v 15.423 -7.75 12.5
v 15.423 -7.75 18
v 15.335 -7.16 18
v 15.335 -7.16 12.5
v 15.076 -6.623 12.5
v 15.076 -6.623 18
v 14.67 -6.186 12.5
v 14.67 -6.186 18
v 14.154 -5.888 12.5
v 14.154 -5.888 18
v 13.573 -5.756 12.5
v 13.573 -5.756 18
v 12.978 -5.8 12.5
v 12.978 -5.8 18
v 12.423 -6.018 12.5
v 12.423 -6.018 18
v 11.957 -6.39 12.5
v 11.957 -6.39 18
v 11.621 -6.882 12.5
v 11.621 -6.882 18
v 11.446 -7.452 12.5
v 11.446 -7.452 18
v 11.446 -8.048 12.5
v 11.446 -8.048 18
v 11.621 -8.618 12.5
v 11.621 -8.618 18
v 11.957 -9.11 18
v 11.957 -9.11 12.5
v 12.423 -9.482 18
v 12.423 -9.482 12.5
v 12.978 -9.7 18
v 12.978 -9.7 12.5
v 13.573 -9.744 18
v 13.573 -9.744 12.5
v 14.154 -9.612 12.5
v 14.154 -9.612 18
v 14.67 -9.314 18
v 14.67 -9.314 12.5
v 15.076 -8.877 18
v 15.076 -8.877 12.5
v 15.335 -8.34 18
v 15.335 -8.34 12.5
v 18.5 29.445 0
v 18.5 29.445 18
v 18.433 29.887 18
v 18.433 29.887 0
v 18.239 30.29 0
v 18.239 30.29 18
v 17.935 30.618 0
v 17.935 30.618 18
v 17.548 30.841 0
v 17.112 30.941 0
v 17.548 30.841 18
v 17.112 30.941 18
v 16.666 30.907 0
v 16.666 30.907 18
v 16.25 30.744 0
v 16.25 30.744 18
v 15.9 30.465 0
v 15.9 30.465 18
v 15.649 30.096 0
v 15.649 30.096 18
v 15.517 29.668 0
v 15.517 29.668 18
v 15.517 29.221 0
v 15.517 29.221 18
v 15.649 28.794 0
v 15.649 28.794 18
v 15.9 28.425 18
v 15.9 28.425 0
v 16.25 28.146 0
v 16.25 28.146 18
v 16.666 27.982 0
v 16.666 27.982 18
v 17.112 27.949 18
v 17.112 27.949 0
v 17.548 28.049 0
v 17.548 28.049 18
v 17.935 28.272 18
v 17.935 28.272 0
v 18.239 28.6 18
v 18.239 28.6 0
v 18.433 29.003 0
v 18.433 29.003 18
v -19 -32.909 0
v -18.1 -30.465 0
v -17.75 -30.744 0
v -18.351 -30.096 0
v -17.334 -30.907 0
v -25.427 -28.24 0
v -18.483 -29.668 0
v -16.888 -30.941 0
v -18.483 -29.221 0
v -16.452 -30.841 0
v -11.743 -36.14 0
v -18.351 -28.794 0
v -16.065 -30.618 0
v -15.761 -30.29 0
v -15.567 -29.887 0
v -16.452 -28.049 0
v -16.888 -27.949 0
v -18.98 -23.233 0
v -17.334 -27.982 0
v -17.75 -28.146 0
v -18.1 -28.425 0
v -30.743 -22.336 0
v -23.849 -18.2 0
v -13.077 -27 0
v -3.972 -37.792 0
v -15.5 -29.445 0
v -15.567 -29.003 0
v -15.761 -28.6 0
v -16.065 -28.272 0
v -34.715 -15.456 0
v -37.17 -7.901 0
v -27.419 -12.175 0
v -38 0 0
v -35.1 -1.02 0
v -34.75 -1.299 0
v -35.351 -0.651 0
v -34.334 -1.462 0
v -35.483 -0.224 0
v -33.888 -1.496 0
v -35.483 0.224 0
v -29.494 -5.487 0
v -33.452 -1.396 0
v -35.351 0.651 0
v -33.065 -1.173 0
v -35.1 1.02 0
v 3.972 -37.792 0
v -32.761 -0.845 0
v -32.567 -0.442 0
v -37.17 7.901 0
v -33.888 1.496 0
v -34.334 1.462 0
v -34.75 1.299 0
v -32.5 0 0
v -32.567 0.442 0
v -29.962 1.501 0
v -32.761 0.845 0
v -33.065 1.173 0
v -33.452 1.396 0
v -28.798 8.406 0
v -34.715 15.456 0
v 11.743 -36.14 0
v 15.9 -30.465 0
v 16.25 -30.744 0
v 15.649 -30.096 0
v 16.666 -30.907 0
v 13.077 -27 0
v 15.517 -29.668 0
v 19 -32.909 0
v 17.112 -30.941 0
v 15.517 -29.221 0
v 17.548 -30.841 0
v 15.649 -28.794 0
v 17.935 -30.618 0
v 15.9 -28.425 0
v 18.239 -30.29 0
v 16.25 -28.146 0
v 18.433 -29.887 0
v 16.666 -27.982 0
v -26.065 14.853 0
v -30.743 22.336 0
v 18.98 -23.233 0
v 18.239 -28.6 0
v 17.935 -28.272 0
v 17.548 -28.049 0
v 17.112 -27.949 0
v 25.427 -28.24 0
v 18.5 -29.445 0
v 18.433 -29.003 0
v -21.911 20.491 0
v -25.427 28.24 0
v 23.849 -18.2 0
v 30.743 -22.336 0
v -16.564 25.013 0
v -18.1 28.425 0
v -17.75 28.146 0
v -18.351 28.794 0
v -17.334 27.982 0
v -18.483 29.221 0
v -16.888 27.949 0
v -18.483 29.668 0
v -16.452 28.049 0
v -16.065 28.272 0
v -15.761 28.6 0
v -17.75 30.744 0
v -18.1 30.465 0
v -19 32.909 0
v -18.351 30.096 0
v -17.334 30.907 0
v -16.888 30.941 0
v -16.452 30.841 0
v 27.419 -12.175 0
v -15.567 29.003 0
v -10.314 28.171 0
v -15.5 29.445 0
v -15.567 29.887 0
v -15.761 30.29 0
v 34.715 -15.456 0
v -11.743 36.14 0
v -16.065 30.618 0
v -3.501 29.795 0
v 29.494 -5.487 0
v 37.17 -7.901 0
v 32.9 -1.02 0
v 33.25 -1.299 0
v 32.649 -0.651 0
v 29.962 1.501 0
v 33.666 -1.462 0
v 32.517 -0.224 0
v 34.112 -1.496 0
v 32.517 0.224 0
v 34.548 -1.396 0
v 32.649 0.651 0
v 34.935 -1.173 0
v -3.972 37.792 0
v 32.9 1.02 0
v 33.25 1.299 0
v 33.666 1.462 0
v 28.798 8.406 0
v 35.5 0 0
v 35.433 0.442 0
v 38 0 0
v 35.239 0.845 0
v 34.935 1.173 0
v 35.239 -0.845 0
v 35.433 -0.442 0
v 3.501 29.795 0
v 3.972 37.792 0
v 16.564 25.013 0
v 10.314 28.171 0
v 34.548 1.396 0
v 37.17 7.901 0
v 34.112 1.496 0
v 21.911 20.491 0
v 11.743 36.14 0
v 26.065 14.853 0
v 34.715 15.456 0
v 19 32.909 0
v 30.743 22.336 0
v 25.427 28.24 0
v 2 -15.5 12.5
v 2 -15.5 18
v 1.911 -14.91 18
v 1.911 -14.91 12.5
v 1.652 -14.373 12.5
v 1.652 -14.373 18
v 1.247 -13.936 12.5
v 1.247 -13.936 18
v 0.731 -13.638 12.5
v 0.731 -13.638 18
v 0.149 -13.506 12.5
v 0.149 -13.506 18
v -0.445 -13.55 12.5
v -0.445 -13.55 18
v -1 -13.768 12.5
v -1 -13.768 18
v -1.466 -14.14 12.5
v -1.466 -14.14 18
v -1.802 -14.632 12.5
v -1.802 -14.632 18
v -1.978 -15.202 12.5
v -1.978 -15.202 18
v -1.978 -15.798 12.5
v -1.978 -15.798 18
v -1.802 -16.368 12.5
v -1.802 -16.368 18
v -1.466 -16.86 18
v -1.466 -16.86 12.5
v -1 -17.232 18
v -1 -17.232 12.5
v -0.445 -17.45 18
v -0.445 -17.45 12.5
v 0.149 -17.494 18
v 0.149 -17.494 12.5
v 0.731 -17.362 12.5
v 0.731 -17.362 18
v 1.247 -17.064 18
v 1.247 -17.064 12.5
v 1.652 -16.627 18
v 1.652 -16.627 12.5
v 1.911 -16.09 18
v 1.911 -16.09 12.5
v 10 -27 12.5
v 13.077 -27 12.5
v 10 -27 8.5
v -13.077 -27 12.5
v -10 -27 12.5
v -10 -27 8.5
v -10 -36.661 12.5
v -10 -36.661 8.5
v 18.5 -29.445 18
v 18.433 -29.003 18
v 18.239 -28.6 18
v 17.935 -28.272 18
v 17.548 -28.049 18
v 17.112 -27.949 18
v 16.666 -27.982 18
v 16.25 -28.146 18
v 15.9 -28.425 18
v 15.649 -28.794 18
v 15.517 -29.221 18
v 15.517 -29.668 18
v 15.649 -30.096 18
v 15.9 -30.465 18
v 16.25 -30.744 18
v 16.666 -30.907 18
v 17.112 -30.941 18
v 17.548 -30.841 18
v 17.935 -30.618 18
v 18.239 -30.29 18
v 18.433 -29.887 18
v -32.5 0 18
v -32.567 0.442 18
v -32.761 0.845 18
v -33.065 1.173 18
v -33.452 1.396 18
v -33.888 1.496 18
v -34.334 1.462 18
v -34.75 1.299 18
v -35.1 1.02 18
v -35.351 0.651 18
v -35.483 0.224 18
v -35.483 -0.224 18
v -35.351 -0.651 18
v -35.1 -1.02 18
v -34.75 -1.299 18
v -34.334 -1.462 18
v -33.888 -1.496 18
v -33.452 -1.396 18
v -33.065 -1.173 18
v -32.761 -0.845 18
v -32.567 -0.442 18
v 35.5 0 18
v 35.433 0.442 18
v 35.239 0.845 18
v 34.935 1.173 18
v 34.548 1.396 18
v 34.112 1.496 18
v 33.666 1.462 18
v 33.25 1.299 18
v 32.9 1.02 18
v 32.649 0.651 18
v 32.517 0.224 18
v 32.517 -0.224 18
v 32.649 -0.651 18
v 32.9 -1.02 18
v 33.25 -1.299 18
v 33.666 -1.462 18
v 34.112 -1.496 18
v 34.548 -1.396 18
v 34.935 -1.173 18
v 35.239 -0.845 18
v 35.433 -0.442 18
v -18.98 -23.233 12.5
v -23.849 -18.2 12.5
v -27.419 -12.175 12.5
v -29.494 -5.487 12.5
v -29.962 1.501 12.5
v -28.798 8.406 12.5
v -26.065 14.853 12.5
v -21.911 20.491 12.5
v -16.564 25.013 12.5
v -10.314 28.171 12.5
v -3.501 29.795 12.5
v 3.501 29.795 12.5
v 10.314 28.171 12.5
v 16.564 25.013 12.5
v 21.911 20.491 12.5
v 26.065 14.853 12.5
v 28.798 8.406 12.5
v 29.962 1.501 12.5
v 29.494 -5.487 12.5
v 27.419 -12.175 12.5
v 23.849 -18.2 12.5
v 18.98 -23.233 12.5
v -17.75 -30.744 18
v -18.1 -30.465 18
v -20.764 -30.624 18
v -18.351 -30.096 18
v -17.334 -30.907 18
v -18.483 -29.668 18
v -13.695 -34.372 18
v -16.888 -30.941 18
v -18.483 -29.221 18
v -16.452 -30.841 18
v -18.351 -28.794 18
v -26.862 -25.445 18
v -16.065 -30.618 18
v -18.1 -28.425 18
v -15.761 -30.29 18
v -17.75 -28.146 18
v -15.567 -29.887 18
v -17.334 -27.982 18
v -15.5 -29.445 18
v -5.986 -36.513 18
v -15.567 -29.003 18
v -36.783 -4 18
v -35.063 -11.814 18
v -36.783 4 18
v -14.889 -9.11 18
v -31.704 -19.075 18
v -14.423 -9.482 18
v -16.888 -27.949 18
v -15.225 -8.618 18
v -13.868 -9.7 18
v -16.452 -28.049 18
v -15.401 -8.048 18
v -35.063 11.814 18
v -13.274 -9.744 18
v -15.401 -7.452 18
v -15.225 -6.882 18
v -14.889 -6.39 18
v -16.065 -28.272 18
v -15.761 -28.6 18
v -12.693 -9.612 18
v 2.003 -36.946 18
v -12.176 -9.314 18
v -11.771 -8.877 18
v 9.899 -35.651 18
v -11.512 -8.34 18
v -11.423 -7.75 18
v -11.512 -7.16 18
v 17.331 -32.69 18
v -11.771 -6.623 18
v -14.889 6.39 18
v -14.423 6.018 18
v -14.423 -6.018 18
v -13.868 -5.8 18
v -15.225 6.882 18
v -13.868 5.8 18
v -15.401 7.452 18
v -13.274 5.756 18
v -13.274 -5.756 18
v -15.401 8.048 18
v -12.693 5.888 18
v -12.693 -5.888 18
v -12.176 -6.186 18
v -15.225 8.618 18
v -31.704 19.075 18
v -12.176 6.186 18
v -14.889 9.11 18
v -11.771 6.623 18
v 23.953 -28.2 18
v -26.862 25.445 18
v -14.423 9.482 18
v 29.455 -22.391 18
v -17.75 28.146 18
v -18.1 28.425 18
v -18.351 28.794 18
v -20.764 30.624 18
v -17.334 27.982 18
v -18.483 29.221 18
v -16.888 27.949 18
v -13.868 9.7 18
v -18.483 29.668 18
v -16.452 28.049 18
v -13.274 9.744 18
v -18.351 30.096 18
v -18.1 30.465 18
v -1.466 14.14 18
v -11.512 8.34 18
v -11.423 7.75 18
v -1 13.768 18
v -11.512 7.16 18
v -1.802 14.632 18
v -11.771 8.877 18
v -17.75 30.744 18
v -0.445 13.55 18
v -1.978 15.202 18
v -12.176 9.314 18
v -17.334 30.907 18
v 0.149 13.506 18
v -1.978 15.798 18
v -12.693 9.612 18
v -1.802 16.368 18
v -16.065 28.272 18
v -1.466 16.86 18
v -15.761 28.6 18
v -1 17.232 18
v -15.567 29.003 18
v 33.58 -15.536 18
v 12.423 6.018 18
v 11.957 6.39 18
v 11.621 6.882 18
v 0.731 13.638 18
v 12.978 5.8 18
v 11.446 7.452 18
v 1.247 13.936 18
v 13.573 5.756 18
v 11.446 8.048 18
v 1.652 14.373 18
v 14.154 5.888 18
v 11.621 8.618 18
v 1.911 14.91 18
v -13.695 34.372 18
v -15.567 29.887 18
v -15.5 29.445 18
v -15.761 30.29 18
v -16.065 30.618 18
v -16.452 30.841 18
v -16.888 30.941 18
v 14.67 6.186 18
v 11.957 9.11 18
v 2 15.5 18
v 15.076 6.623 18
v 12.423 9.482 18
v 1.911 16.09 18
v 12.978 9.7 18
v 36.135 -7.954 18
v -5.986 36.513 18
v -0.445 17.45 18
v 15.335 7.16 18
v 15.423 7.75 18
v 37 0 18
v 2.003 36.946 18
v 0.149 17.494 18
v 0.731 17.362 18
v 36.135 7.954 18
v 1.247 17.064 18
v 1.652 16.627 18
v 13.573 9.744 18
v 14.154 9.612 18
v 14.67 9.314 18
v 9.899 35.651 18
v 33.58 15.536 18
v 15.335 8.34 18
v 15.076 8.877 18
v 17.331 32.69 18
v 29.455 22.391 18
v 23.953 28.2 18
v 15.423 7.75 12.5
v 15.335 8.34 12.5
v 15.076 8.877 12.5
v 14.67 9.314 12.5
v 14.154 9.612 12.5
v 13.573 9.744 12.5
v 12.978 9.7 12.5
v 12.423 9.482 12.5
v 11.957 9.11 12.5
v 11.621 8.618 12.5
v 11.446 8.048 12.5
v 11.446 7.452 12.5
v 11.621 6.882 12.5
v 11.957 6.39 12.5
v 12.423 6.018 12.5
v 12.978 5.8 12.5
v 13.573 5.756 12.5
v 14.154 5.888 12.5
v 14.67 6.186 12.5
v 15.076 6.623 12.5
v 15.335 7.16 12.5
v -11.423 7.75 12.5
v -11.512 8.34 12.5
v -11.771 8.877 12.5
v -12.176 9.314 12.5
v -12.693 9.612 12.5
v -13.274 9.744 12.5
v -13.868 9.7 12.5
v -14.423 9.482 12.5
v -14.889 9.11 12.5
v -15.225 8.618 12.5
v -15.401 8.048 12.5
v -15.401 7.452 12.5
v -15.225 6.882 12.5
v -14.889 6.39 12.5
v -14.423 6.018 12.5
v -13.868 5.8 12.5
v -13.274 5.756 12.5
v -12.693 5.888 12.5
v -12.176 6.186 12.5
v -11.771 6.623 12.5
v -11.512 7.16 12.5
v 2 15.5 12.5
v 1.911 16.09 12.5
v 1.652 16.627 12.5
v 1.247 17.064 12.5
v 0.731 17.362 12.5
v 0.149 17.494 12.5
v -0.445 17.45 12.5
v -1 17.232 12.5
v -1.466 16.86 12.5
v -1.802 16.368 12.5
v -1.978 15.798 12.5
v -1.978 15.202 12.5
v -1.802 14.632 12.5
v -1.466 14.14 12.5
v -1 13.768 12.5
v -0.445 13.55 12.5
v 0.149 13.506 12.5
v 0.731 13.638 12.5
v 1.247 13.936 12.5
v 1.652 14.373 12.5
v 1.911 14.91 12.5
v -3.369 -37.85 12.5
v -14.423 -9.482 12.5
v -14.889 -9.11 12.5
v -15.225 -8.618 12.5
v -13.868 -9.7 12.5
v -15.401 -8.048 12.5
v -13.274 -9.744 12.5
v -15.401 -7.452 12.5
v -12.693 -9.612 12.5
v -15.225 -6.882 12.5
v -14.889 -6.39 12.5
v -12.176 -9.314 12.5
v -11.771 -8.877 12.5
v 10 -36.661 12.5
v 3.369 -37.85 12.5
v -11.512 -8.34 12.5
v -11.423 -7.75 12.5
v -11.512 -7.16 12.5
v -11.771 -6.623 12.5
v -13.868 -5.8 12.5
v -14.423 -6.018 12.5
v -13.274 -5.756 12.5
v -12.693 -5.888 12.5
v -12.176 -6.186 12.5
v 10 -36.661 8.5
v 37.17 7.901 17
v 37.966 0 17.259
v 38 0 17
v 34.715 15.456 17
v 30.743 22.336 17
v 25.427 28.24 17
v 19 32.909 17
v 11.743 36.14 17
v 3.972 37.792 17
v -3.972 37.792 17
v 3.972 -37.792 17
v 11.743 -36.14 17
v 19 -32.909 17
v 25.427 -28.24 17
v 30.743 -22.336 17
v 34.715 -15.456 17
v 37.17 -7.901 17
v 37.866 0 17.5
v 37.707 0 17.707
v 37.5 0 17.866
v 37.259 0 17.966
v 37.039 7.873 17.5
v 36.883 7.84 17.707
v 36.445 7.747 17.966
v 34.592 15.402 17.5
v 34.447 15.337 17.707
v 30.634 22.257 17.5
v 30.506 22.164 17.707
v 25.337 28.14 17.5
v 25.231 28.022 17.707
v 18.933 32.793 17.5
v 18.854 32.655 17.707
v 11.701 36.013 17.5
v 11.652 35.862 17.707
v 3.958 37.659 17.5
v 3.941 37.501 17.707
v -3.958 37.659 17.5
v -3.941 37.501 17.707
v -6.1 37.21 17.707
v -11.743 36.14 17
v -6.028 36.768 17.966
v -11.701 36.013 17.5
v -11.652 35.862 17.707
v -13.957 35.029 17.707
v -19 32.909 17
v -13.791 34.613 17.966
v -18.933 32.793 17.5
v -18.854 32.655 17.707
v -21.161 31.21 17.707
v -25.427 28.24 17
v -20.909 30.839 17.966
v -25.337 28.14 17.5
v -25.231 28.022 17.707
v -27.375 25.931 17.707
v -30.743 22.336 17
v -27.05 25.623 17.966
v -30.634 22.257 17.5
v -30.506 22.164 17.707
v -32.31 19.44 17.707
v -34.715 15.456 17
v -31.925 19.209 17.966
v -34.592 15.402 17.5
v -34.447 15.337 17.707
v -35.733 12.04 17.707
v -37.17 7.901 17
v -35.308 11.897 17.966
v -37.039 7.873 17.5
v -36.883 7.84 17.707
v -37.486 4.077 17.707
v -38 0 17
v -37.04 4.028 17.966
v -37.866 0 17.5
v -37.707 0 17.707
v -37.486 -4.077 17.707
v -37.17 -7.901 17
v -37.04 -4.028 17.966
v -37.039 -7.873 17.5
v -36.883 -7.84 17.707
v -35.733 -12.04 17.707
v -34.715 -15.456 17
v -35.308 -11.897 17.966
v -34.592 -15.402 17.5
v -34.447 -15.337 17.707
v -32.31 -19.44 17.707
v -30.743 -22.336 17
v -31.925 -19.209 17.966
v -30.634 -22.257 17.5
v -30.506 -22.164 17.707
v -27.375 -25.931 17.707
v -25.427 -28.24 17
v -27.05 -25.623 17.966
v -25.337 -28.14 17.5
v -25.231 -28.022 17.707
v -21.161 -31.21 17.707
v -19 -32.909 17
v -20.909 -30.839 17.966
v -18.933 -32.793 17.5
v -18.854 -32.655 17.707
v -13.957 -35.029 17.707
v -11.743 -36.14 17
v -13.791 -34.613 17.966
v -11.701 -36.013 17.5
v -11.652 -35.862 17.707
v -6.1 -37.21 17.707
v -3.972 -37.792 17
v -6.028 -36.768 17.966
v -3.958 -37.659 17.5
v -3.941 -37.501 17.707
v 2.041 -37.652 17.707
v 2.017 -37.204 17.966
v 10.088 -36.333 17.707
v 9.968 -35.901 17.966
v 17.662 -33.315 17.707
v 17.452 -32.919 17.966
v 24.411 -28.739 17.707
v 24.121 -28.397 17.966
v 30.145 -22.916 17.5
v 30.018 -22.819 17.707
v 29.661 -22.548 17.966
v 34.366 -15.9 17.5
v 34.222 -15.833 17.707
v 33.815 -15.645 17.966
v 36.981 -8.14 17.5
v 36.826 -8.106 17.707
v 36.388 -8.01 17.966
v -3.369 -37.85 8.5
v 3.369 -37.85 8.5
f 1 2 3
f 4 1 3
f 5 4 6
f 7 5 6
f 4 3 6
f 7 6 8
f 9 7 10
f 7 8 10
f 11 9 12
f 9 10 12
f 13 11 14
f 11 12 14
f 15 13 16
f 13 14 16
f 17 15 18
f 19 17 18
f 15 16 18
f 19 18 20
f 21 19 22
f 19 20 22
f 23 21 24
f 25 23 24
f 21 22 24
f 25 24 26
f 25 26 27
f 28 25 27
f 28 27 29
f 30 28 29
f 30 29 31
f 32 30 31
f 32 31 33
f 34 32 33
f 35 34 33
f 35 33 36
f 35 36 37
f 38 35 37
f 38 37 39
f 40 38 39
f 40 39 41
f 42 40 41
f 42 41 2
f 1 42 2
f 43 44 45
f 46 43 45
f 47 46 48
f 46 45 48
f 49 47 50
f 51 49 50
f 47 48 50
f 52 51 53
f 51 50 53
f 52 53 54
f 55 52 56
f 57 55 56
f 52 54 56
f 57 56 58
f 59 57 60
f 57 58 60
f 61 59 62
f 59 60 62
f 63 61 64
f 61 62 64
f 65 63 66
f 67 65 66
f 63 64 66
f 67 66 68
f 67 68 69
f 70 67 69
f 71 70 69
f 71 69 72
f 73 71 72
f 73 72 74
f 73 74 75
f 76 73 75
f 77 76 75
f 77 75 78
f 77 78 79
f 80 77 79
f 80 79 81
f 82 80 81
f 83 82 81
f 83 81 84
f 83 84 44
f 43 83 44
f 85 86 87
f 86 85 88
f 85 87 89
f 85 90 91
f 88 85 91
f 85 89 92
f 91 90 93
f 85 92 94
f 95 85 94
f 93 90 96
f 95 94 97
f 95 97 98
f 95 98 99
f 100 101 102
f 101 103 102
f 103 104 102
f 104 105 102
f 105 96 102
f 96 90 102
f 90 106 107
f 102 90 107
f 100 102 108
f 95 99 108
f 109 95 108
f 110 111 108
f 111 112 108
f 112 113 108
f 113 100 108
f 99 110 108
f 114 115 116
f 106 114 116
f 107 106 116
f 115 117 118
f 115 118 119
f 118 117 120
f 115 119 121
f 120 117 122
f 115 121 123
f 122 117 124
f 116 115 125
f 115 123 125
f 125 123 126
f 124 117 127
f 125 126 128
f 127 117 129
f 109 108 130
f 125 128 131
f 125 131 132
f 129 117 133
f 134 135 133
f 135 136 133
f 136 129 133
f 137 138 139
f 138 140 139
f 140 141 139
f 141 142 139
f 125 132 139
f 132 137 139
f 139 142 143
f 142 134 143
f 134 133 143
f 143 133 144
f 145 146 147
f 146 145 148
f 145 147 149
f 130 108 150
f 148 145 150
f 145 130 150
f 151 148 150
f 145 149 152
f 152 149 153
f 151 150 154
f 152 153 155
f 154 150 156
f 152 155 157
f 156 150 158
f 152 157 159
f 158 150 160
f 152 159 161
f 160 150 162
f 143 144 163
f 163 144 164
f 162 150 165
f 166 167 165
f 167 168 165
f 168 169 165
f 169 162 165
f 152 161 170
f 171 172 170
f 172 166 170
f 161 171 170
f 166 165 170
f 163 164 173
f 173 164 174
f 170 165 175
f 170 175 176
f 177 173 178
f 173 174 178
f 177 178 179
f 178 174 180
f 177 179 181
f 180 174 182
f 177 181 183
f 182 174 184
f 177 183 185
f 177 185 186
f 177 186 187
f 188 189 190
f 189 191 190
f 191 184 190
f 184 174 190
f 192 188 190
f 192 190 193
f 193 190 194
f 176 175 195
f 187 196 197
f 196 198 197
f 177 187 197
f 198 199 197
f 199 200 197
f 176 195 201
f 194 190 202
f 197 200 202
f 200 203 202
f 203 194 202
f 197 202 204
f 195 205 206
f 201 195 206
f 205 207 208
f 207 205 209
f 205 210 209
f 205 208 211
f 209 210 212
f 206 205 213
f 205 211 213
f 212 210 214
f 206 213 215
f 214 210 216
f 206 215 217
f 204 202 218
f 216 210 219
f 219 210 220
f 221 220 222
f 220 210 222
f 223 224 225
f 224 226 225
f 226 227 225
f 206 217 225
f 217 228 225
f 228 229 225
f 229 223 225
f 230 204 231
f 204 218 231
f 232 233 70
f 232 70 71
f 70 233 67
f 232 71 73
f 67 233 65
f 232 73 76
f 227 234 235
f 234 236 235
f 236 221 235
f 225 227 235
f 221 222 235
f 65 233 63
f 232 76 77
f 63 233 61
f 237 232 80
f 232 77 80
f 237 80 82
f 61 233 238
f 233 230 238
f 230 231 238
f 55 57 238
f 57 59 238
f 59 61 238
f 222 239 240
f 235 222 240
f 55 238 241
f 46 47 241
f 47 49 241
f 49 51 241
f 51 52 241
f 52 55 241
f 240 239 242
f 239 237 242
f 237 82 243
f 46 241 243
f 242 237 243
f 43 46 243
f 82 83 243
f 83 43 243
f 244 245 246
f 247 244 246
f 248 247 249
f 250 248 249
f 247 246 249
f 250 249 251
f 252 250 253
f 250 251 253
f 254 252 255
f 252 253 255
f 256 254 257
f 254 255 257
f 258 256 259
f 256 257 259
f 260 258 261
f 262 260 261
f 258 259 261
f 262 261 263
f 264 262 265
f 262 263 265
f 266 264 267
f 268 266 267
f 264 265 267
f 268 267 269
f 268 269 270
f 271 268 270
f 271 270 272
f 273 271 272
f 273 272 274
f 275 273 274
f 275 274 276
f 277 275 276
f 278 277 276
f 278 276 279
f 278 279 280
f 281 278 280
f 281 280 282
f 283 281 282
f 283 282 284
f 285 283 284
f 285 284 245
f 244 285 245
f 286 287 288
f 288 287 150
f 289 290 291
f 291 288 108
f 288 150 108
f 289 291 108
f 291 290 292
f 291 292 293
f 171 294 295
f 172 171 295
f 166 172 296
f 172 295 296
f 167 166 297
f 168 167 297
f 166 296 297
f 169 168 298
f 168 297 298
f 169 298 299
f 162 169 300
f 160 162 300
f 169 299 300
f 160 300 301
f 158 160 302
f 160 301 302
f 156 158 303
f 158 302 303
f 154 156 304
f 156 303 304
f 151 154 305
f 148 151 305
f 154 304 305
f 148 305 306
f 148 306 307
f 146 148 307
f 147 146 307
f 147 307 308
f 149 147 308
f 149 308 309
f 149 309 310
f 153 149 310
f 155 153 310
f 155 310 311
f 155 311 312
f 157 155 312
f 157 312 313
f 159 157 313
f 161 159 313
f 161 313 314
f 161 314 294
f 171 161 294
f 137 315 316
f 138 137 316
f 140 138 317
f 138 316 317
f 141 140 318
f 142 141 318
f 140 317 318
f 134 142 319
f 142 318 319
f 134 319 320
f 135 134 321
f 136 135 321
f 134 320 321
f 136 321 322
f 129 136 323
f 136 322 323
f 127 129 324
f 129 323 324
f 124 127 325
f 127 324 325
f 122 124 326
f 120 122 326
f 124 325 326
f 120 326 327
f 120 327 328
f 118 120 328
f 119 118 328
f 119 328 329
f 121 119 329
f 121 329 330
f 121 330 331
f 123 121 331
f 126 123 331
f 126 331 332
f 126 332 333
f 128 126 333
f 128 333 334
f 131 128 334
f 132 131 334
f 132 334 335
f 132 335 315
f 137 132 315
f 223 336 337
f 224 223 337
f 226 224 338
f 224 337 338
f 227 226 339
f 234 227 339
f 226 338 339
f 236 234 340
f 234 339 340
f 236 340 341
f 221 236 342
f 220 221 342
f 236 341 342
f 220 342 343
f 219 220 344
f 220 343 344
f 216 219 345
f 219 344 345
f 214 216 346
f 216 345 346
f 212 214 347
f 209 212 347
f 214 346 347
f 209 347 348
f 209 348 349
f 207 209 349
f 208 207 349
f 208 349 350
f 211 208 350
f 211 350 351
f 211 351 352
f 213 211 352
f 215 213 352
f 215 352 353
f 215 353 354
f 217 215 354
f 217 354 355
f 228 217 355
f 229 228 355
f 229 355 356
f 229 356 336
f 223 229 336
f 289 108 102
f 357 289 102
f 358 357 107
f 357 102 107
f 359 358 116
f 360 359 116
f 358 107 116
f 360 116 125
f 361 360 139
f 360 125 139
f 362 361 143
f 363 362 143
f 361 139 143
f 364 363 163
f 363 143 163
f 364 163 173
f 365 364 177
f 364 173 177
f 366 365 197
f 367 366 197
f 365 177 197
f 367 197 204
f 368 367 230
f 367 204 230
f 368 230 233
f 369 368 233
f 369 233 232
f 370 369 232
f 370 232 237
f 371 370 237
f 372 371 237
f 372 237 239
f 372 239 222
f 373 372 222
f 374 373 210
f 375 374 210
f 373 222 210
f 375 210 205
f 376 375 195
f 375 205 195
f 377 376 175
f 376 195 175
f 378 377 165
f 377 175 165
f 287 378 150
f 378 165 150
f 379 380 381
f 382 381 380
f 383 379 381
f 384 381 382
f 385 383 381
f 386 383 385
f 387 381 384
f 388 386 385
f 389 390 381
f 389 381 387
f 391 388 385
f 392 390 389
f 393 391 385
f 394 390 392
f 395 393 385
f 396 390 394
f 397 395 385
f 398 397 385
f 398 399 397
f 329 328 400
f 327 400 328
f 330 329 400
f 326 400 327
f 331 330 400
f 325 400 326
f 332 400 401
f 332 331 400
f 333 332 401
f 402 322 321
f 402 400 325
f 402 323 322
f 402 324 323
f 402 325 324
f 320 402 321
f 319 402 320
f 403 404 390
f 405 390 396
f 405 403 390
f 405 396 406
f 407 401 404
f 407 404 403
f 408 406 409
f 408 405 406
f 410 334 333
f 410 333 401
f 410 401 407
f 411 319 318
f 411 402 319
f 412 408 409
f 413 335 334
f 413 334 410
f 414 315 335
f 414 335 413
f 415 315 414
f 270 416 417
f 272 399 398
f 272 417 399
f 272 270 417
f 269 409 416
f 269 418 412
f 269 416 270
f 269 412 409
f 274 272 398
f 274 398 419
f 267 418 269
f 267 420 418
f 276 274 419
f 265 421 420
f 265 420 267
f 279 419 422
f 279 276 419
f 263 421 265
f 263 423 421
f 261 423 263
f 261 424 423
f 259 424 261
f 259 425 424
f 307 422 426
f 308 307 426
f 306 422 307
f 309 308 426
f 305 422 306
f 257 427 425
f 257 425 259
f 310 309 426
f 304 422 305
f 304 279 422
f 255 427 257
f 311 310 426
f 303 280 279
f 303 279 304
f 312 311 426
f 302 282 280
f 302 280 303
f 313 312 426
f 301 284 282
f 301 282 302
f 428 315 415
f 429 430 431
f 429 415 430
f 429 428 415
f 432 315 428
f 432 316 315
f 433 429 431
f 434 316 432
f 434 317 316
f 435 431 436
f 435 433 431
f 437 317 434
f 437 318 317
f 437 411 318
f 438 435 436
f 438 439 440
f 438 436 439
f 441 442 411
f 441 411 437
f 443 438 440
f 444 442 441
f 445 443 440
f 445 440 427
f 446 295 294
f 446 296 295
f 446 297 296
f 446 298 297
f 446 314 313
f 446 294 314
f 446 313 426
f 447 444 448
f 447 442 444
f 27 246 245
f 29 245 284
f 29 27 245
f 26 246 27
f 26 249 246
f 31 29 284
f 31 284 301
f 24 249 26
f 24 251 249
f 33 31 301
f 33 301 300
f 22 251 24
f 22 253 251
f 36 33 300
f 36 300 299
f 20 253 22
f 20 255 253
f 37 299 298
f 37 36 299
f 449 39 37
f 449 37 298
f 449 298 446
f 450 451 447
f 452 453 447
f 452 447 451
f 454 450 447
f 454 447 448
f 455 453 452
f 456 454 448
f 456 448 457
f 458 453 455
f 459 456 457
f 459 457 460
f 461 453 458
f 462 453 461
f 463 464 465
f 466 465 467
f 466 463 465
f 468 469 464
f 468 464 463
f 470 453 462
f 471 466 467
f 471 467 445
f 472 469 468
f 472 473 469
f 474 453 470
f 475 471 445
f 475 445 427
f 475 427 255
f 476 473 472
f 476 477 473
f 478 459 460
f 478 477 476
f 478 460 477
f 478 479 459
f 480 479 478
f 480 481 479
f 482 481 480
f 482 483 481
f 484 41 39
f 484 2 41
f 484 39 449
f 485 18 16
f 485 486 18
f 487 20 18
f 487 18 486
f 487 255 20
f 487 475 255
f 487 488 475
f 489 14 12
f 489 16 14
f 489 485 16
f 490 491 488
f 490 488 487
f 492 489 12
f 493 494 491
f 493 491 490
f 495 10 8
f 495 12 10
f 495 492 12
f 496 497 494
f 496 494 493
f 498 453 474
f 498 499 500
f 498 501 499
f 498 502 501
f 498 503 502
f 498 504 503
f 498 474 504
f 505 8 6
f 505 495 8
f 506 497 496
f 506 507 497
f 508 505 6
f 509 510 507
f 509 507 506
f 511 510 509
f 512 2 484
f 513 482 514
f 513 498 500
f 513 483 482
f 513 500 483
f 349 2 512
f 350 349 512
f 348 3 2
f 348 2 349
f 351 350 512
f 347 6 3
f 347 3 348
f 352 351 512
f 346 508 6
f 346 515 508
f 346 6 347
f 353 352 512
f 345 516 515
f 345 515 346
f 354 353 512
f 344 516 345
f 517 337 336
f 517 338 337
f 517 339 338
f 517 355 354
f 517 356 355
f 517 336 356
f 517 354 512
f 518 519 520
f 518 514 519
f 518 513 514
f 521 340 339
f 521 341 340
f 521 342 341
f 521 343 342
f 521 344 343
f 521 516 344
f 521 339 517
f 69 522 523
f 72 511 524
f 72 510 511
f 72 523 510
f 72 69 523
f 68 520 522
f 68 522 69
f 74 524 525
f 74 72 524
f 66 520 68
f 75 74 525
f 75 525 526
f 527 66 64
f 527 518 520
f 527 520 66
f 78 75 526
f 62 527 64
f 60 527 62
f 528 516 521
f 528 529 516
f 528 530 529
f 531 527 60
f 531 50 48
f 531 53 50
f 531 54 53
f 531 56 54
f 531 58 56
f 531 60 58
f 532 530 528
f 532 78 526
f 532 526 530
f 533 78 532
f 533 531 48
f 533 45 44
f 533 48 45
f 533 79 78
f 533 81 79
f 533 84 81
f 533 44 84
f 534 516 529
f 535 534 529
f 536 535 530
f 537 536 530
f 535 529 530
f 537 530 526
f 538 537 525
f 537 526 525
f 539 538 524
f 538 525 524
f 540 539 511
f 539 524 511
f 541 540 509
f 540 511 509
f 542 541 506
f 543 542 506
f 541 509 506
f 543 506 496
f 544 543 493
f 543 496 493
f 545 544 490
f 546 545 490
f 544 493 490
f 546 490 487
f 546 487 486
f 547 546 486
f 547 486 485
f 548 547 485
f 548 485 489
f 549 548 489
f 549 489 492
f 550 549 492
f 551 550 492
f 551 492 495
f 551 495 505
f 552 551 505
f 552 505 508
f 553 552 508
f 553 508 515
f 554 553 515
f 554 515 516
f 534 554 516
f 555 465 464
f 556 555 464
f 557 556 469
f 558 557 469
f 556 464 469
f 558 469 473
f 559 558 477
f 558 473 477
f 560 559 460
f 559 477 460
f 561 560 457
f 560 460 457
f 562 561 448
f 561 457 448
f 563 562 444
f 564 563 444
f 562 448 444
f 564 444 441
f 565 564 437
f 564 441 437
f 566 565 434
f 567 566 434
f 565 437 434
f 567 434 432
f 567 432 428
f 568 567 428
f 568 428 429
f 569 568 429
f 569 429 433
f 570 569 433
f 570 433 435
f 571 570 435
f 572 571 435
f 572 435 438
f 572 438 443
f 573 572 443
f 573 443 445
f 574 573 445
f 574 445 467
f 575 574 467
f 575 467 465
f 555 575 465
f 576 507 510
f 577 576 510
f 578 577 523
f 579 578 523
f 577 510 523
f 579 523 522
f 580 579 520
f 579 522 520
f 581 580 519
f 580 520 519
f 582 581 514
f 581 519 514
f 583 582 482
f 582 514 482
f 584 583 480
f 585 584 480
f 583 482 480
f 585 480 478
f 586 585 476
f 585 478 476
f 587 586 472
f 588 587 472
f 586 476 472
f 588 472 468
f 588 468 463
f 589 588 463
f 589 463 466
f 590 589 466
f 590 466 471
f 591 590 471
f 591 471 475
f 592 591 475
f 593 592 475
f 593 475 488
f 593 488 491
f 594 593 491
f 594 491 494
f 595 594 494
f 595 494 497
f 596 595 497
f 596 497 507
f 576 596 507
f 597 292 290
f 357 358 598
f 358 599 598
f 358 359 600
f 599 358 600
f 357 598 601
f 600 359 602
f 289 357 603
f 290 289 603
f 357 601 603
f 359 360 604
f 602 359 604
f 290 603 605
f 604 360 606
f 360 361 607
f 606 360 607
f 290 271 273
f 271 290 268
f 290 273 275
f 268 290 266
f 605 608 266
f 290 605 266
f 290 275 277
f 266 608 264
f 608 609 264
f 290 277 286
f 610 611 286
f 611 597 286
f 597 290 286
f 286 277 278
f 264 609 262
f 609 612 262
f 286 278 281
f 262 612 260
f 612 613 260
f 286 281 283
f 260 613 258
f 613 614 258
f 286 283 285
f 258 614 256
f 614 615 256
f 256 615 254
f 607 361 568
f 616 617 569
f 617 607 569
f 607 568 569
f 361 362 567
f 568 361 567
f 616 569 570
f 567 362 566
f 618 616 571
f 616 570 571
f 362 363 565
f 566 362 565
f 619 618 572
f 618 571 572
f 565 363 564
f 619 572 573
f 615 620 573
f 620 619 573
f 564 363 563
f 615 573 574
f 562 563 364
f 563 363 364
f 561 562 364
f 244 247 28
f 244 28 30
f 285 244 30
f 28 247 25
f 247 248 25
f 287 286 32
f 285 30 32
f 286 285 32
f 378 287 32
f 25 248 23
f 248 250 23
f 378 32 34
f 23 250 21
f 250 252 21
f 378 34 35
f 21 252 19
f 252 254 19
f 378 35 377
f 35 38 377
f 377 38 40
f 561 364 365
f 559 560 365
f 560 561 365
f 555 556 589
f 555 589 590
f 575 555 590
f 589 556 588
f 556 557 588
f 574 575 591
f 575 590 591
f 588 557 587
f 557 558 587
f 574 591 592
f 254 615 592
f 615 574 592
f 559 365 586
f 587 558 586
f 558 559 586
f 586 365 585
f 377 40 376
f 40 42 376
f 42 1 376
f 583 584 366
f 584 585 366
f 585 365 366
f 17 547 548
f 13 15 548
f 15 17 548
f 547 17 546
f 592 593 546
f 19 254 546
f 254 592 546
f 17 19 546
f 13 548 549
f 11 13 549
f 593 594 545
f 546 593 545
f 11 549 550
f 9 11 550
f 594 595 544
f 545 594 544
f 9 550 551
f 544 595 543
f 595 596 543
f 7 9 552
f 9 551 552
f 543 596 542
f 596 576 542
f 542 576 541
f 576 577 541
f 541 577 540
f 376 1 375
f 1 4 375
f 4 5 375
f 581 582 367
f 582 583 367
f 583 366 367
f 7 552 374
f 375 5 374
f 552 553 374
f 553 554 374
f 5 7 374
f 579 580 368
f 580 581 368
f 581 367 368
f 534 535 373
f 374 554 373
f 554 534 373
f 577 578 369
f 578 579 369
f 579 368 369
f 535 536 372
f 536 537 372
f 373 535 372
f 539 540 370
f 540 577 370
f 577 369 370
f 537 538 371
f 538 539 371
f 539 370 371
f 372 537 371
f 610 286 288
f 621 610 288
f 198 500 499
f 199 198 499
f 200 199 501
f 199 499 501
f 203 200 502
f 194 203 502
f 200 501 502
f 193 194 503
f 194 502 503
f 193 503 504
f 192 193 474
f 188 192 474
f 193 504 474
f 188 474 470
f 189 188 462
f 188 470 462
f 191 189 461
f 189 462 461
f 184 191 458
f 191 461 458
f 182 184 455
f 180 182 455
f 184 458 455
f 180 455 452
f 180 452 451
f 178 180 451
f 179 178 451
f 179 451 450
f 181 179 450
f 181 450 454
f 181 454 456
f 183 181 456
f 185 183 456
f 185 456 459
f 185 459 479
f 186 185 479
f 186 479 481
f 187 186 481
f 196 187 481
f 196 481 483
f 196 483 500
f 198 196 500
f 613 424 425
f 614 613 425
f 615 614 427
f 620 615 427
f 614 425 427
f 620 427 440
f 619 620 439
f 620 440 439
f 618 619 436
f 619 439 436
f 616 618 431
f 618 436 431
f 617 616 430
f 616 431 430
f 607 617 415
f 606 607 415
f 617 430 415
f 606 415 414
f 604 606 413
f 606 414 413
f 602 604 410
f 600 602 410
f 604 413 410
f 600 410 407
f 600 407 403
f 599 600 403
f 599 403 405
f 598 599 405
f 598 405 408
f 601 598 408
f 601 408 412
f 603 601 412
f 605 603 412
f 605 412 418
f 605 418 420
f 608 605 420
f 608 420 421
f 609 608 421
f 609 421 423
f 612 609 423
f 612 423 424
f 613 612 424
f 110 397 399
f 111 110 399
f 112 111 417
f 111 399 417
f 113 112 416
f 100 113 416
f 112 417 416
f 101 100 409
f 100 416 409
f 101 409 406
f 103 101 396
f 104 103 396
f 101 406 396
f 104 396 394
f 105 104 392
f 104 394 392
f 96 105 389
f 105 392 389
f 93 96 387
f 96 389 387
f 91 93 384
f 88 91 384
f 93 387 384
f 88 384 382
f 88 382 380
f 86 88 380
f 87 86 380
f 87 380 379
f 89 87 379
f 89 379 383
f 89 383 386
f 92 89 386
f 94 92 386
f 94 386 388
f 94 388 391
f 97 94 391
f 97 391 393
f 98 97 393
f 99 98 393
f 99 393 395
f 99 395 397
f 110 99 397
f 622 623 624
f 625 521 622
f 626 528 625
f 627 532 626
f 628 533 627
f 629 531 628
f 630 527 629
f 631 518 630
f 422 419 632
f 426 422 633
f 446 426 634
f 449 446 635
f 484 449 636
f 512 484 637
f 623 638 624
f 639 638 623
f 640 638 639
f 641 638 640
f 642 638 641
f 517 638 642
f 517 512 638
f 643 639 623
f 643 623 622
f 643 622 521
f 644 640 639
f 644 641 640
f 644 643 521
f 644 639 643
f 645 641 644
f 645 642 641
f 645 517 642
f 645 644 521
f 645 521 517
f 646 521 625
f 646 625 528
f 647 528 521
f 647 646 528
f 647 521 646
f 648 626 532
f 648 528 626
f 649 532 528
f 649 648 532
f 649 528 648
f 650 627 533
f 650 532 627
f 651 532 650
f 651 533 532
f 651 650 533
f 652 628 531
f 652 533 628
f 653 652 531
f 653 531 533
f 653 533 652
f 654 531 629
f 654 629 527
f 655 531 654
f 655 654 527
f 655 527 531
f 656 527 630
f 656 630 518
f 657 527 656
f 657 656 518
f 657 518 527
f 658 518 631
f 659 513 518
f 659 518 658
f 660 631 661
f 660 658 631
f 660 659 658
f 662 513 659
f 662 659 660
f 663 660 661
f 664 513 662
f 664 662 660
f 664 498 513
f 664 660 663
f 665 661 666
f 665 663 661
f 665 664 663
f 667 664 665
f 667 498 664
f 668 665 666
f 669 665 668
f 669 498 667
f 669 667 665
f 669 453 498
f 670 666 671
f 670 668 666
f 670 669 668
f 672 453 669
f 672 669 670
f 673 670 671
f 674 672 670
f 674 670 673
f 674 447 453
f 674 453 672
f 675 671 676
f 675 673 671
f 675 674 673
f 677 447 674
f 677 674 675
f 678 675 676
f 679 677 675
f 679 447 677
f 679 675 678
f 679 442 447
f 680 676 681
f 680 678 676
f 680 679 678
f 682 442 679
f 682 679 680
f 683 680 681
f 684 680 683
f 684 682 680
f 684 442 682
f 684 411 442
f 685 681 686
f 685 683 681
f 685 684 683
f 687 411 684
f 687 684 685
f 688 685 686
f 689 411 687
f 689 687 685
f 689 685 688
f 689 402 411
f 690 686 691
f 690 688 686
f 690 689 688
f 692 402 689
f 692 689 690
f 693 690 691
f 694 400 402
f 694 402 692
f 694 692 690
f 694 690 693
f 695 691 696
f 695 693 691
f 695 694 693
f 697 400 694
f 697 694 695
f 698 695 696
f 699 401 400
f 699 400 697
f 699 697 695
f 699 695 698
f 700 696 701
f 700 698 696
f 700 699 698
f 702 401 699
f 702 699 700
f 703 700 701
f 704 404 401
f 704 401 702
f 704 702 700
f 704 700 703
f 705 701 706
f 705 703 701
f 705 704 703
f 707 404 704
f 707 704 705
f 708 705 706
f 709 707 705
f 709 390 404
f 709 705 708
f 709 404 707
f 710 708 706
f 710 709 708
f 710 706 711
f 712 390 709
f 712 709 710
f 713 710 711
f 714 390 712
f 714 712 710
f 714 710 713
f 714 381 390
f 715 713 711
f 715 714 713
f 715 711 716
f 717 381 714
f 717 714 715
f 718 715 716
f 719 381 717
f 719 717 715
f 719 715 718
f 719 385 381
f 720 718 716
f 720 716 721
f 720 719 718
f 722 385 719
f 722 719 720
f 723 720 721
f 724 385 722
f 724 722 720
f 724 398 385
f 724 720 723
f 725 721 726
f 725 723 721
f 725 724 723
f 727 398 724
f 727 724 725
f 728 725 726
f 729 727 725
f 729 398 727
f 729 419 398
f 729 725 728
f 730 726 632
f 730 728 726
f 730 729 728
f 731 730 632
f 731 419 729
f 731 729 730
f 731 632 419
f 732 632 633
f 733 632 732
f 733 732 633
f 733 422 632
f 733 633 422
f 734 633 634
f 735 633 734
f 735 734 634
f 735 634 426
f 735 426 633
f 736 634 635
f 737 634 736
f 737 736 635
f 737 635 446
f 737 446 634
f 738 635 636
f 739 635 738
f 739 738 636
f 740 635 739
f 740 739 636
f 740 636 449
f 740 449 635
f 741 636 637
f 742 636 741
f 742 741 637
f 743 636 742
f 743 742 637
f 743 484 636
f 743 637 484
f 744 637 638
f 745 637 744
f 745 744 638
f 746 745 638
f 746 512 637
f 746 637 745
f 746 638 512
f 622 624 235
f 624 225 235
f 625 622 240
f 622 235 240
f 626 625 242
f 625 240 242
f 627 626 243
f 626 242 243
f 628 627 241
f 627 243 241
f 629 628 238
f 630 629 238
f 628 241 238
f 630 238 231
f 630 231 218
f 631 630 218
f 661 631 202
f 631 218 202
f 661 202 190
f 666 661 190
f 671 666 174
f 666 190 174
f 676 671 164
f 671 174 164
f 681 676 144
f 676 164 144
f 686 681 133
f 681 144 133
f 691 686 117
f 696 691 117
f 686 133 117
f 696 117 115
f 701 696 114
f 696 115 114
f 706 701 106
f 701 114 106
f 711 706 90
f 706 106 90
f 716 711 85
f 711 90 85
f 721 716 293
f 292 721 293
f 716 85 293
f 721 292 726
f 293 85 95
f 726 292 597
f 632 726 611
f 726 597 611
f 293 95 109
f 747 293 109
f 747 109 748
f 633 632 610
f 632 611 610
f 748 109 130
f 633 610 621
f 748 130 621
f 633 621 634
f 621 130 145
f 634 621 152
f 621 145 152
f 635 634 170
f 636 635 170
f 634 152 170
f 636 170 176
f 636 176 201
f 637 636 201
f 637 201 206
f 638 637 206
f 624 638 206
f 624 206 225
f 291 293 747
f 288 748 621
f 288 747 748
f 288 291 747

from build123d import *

# Parameters (mm, degrees)
SKETCH_1_R          = 38
EXTRUDE_1_DEPTH     = 18
CUT_EXTRUDE_1_REACH = 20
SKETCH_2_R          = 1.5
CUT_EXTRUDE_2_DEPTH = 12.5
FILLET_1_R          = 1
CUT_EXTRUDE_7_REACH = 13
SKETCH_6_W          = 20
SKETCH_6_H          = 4
CUT_EXTRUDE_8_REACH = 20
SKETCH_7_R          = 2


with BuildPart() as part:
    # Эскиз1 → Бобышка-Вытянуть1 (new body)
    with BuildSketch(Plane.XY):
        Circle(SKETCH_1_R)
    extrude(amount=EXTRUDE_1_DEPTH)

    # Эскиз2 → Вырез-Вытянуть1 (cut, up to next)
    with BuildSketch(Plane.XY.offset(18), mode=Mode.PRIVATE) as cut_extrude_1_sk1:
        with Locations((-34, 0)):
            Circle(SKETCH_2_R)
    cut_extrude_1_tool1 = extrude(cut_extrude_1_sk1.sketch, amount=-CUT_EXTRUDE_1_REACH, mode=Mode.PRIVATE) & part.part
    add(cut_extrude_1_tool1.solids().sort_by_distance((-34, 0, 18))[0], mode=Mode.SUBTRACT)
    # Эскиз2 → Вырез-Вытянуть1 (cut, up to next)
    with BuildSketch(Plane.XY.offset(18), mode=Mode.PRIVATE) as cut_extrude_1_sk2:
        with Locations((-17, 29.444863729)):
            Circle(SKETCH_2_R)
    cut_extrude_1_tool2 = extrude(cut_extrude_1_sk2.sketch, amount=-CUT_EXTRUDE_1_REACH, mode=Mode.PRIVATE) & part.part
    add(cut_extrude_1_tool2.solids().sort_by_distance((-17, 29.444864, 18))[0], mode=Mode.SUBTRACT)
    # Эскиз2 → Вырез-Вытянуть1 (cut, up to next)
    with BuildSketch(Plane.XY.offset(18), mode=Mode.PRIVATE) as cut_extrude_1_sk3:
        with Locations((17, 29.444863729)):
            Circle(SKETCH_2_R)
    cut_extrude_1_tool3 = extrude(cut_extrude_1_sk3.sketch, amount=-CUT_EXTRUDE_1_REACH, mode=Mode.PRIVATE) & part.part
    add(cut_extrude_1_tool3.solids().sort_by_distance((17, 29.444864, 18))[0], mode=Mode.SUBTRACT)
    # Эскиз2 → Вырез-Вытянуть1 (cut, up to next)
    with BuildSketch(Plane.XY.offset(18), mode=Mode.PRIVATE) as cut_extrude_1_sk4:
        with Locations((34, 0)):
            Circle(SKETCH_2_R)
    cut_extrude_1_tool4 = extrude(cut_extrude_1_sk4.sketch, amount=-CUT_EXTRUDE_1_REACH, mode=Mode.PRIVATE) & part.part
    add(cut_extrude_1_tool4.solids().sort_by_distance((34, 0, 18))[0], mode=Mode.SUBTRACT)
    # Эскиз2 → Вырез-Вытянуть1 (cut, up to next)
    with BuildSketch(Plane.XY.offset(18), mode=Mode.PRIVATE) as cut_extrude_1_sk5:
        with Locations((17, -29.444863729)):
            Circle(SKETCH_2_R)
    cut_extrude_1_tool5 = extrude(cut_extrude_1_sk5.sketch, amount=-CUT_EXTRUDE_1_REACH, mode=Mode.PRIVATE) & part.part
    add(cut_extrude_1_tool5.solids().sort_by_distance((17, -29.444864, 18))[0], mode=Mode.SUBTRACT)
    # Эскиз2 → Вырез-Вытянуть1 (cut, up to next)
    with BuildSketch(Plane.XY.offset(18), mode=Mode.PRIVATE) as cut_extrude_1_sk6:
        with Locations((-17, -29.444863729)):
            Circle(SKETCH_2_R)
    cut_extrude_1_tool6 = extrude(cut_extrude_1_sk6.sketch, amount=-CUT_EXTRUDE_1_REACH, mode=Mode.PRIVATE) & part.part
    add(cut_extrude_1_tool6.solids().sort_by_distance((-17, -29.444864, 18))[0], mode=Mode.SUBTRACT)

    # Эскиз3 → Вырез-Вытянуть2 (cut)
    with BuildSketch(Plane(origin=(0, 0, 0), x_dir=(-1, 0, 0), z_dir=(0, 0, -1))):
        with BuildLine():
            Line((-13.076696831, -27), (13.076696831, -27))
            ThreePointArc((13.076696831, -27), (0, 30), (-13.076696831, -27))
        make_face()
    extrude(amount=-CUT_EXTRUDE_2_DEPTH, mode=Mode.SUBTRACT)

    # Скругление1
    fillet_1_edges = [part.edges().sort_by_distance(p)[0] for p in [
        (-38, 0, 18),
    ]]
    fillet(fillet_1_edges, radius=FILLET_1_R)

    # Эскиз6 → Вырез-Вытянуть7 (cut, up to next)
    with BuildSketch(Plane(origin=(0, -27, 0), x_dir=(1, 0, 0), z_dir=(0, 1, 0)), mode=Mode.PRIVATE) as cut_extrude_7_sk1:
        with Locations((0, -10.5)):
            Rectangle(SKETCH_6_W, SKETCH_6_H)
    cut_extrude_7_tool1 = extrude(cut_extrude_7_sk1.sketch, amount=-CUT_EXTRUDE_7_REACH, mode=Mode.PRIVATE) & part.part
    add(cut_extrude_7_tool1.solids().sort_by_distance((0, -27, 10.5))[0], mode=Mode.SUBTRACT)

    # Эскиз7 → Вырез-Вытянуть8 (cut, up to next)
    with BuildSketch(Plane.XY.offset(18), mode=Mode.PRIVATE) as cut_extrude_8_sk1:
        with Locations((0, 15.5)):
            Circle(SKETCH_7_R)
    cut_extrude_8_tool1 = extrude(cut_extrude_8_sk1.sketch, amount=-CUT_EXTRUDE_8_REACH, mode=Mode.PRIVATE) & part.part
    add(cut_extrude_8_tool1.solids().sort_by_distance((0, 15.5, 18))[0], mode=Mode.SUBTRACT)
    # Эскиз7 → Вырез-Вытянуть8 (cut, up to next)
    with BuildSketch(Plane.XY.offset(18), mode=Mode.PRIVATE) as cut_extrude_8_sk2:
        with Locations((13.423393759, 7.75)):
            Circle(SKETCH_7_R)
    cut_extrude_8_tool2 = extrude(cut_extrude_8_sk2.sketch, amount=-CUT_EXTRUDE_8_REACH, mode=Mode.PRIVATE) & part.part
    add(cut_extrude_8_tool2.solids().sort_by_distance((13.423394, 7.75, 18))[0], mode=Mode.SUBTRACT)
    # Эскиз7 → Вырез-Вытянуть8 (cut, up to next)
    with BuildSketch(Plane.XY.offset(18), mode=Mode.PRIVATE) as cut_extrude_8_sk3:
        with Locations((13.423393759, -7.75)):
            Circle(SKETCH_7_R)
    cut_extrude_8_tool3 = extrude(cut_extrude_8_sk3.sketch, amount=-CUT_EXTRUDE_8_REACH, mode=Mode.PRIVATE) & part.part
    add(cut_extrude_8_tool3.solids().sort_by_distance((13.423394, -7.75, 18))[0], mode=Mode.SUBTRACT)
    # Эскиз7 → Вырез-Вытянуть8 (cut, up to next)
    with BuildSketch(Plane.XY.offset(18), mode=Mode.PRIVATE) as cut_extrude_8_sk4:
        with Locations((0, -15.5)):
            Circle(SKETCH_7_R)
    cut_extrude_8_tool4 = extrude(cut_extrude_8_sk4.sketch, amount=-CUT_EXTRUDE_8_REACH, mode=Mode.PRIVATE) & part.part
    add(cut_extrude_8_tool4.solids().sort_by_distance((0, -15.5, 18))[0], mode=Mode.SUBTRACT)
    # Эскиз7 → Вырез-Вытянуть8 (cut, up to next)
    with BuildSketch(Plane.XY.offset(18), mode=Mode.PRIVATE) as cut_extrude_8_sk5:
        with Locations((-13.423393759, -7.75)):
            Circle(SKETCH_7_R)
    cut_extrude_8_tool5 = extrude(cut_extrude_8_sk5.sketch, amount=-CUT_EXTRUDE_8_REACH, mode=Mode.PRIVATE) & part.part
    add(cut_extrude_8_tool5.solids().sort_by_distance((-13.423394, -7.75, 18))[0], mode=Mode.SUBTRACT)
    # Эскиз7 → Вырез-Вытянуть8 (cut, up to next)
    with BuildSketch(Plane.XY.offset(18), mode=Mode.PRIVATE) as cut_extrude_8_sk6:
        with Locations((-13.423393759, 7.75)):
            Circle(SKETCH_7_R)
    cut_extrude_8_tool6 = extrude(cut_extrude_8_sk6.sketch, amount=-CUT_EXTRUDE_8_REACH, mode=Mode.PRIVATE) & part.part
    add(cut_extrude_8_tool6.solids().sort_by_distance((-13.423394, 7.75, 18))[0], mode=Mode.SUBTRACT)


solid = part.part
